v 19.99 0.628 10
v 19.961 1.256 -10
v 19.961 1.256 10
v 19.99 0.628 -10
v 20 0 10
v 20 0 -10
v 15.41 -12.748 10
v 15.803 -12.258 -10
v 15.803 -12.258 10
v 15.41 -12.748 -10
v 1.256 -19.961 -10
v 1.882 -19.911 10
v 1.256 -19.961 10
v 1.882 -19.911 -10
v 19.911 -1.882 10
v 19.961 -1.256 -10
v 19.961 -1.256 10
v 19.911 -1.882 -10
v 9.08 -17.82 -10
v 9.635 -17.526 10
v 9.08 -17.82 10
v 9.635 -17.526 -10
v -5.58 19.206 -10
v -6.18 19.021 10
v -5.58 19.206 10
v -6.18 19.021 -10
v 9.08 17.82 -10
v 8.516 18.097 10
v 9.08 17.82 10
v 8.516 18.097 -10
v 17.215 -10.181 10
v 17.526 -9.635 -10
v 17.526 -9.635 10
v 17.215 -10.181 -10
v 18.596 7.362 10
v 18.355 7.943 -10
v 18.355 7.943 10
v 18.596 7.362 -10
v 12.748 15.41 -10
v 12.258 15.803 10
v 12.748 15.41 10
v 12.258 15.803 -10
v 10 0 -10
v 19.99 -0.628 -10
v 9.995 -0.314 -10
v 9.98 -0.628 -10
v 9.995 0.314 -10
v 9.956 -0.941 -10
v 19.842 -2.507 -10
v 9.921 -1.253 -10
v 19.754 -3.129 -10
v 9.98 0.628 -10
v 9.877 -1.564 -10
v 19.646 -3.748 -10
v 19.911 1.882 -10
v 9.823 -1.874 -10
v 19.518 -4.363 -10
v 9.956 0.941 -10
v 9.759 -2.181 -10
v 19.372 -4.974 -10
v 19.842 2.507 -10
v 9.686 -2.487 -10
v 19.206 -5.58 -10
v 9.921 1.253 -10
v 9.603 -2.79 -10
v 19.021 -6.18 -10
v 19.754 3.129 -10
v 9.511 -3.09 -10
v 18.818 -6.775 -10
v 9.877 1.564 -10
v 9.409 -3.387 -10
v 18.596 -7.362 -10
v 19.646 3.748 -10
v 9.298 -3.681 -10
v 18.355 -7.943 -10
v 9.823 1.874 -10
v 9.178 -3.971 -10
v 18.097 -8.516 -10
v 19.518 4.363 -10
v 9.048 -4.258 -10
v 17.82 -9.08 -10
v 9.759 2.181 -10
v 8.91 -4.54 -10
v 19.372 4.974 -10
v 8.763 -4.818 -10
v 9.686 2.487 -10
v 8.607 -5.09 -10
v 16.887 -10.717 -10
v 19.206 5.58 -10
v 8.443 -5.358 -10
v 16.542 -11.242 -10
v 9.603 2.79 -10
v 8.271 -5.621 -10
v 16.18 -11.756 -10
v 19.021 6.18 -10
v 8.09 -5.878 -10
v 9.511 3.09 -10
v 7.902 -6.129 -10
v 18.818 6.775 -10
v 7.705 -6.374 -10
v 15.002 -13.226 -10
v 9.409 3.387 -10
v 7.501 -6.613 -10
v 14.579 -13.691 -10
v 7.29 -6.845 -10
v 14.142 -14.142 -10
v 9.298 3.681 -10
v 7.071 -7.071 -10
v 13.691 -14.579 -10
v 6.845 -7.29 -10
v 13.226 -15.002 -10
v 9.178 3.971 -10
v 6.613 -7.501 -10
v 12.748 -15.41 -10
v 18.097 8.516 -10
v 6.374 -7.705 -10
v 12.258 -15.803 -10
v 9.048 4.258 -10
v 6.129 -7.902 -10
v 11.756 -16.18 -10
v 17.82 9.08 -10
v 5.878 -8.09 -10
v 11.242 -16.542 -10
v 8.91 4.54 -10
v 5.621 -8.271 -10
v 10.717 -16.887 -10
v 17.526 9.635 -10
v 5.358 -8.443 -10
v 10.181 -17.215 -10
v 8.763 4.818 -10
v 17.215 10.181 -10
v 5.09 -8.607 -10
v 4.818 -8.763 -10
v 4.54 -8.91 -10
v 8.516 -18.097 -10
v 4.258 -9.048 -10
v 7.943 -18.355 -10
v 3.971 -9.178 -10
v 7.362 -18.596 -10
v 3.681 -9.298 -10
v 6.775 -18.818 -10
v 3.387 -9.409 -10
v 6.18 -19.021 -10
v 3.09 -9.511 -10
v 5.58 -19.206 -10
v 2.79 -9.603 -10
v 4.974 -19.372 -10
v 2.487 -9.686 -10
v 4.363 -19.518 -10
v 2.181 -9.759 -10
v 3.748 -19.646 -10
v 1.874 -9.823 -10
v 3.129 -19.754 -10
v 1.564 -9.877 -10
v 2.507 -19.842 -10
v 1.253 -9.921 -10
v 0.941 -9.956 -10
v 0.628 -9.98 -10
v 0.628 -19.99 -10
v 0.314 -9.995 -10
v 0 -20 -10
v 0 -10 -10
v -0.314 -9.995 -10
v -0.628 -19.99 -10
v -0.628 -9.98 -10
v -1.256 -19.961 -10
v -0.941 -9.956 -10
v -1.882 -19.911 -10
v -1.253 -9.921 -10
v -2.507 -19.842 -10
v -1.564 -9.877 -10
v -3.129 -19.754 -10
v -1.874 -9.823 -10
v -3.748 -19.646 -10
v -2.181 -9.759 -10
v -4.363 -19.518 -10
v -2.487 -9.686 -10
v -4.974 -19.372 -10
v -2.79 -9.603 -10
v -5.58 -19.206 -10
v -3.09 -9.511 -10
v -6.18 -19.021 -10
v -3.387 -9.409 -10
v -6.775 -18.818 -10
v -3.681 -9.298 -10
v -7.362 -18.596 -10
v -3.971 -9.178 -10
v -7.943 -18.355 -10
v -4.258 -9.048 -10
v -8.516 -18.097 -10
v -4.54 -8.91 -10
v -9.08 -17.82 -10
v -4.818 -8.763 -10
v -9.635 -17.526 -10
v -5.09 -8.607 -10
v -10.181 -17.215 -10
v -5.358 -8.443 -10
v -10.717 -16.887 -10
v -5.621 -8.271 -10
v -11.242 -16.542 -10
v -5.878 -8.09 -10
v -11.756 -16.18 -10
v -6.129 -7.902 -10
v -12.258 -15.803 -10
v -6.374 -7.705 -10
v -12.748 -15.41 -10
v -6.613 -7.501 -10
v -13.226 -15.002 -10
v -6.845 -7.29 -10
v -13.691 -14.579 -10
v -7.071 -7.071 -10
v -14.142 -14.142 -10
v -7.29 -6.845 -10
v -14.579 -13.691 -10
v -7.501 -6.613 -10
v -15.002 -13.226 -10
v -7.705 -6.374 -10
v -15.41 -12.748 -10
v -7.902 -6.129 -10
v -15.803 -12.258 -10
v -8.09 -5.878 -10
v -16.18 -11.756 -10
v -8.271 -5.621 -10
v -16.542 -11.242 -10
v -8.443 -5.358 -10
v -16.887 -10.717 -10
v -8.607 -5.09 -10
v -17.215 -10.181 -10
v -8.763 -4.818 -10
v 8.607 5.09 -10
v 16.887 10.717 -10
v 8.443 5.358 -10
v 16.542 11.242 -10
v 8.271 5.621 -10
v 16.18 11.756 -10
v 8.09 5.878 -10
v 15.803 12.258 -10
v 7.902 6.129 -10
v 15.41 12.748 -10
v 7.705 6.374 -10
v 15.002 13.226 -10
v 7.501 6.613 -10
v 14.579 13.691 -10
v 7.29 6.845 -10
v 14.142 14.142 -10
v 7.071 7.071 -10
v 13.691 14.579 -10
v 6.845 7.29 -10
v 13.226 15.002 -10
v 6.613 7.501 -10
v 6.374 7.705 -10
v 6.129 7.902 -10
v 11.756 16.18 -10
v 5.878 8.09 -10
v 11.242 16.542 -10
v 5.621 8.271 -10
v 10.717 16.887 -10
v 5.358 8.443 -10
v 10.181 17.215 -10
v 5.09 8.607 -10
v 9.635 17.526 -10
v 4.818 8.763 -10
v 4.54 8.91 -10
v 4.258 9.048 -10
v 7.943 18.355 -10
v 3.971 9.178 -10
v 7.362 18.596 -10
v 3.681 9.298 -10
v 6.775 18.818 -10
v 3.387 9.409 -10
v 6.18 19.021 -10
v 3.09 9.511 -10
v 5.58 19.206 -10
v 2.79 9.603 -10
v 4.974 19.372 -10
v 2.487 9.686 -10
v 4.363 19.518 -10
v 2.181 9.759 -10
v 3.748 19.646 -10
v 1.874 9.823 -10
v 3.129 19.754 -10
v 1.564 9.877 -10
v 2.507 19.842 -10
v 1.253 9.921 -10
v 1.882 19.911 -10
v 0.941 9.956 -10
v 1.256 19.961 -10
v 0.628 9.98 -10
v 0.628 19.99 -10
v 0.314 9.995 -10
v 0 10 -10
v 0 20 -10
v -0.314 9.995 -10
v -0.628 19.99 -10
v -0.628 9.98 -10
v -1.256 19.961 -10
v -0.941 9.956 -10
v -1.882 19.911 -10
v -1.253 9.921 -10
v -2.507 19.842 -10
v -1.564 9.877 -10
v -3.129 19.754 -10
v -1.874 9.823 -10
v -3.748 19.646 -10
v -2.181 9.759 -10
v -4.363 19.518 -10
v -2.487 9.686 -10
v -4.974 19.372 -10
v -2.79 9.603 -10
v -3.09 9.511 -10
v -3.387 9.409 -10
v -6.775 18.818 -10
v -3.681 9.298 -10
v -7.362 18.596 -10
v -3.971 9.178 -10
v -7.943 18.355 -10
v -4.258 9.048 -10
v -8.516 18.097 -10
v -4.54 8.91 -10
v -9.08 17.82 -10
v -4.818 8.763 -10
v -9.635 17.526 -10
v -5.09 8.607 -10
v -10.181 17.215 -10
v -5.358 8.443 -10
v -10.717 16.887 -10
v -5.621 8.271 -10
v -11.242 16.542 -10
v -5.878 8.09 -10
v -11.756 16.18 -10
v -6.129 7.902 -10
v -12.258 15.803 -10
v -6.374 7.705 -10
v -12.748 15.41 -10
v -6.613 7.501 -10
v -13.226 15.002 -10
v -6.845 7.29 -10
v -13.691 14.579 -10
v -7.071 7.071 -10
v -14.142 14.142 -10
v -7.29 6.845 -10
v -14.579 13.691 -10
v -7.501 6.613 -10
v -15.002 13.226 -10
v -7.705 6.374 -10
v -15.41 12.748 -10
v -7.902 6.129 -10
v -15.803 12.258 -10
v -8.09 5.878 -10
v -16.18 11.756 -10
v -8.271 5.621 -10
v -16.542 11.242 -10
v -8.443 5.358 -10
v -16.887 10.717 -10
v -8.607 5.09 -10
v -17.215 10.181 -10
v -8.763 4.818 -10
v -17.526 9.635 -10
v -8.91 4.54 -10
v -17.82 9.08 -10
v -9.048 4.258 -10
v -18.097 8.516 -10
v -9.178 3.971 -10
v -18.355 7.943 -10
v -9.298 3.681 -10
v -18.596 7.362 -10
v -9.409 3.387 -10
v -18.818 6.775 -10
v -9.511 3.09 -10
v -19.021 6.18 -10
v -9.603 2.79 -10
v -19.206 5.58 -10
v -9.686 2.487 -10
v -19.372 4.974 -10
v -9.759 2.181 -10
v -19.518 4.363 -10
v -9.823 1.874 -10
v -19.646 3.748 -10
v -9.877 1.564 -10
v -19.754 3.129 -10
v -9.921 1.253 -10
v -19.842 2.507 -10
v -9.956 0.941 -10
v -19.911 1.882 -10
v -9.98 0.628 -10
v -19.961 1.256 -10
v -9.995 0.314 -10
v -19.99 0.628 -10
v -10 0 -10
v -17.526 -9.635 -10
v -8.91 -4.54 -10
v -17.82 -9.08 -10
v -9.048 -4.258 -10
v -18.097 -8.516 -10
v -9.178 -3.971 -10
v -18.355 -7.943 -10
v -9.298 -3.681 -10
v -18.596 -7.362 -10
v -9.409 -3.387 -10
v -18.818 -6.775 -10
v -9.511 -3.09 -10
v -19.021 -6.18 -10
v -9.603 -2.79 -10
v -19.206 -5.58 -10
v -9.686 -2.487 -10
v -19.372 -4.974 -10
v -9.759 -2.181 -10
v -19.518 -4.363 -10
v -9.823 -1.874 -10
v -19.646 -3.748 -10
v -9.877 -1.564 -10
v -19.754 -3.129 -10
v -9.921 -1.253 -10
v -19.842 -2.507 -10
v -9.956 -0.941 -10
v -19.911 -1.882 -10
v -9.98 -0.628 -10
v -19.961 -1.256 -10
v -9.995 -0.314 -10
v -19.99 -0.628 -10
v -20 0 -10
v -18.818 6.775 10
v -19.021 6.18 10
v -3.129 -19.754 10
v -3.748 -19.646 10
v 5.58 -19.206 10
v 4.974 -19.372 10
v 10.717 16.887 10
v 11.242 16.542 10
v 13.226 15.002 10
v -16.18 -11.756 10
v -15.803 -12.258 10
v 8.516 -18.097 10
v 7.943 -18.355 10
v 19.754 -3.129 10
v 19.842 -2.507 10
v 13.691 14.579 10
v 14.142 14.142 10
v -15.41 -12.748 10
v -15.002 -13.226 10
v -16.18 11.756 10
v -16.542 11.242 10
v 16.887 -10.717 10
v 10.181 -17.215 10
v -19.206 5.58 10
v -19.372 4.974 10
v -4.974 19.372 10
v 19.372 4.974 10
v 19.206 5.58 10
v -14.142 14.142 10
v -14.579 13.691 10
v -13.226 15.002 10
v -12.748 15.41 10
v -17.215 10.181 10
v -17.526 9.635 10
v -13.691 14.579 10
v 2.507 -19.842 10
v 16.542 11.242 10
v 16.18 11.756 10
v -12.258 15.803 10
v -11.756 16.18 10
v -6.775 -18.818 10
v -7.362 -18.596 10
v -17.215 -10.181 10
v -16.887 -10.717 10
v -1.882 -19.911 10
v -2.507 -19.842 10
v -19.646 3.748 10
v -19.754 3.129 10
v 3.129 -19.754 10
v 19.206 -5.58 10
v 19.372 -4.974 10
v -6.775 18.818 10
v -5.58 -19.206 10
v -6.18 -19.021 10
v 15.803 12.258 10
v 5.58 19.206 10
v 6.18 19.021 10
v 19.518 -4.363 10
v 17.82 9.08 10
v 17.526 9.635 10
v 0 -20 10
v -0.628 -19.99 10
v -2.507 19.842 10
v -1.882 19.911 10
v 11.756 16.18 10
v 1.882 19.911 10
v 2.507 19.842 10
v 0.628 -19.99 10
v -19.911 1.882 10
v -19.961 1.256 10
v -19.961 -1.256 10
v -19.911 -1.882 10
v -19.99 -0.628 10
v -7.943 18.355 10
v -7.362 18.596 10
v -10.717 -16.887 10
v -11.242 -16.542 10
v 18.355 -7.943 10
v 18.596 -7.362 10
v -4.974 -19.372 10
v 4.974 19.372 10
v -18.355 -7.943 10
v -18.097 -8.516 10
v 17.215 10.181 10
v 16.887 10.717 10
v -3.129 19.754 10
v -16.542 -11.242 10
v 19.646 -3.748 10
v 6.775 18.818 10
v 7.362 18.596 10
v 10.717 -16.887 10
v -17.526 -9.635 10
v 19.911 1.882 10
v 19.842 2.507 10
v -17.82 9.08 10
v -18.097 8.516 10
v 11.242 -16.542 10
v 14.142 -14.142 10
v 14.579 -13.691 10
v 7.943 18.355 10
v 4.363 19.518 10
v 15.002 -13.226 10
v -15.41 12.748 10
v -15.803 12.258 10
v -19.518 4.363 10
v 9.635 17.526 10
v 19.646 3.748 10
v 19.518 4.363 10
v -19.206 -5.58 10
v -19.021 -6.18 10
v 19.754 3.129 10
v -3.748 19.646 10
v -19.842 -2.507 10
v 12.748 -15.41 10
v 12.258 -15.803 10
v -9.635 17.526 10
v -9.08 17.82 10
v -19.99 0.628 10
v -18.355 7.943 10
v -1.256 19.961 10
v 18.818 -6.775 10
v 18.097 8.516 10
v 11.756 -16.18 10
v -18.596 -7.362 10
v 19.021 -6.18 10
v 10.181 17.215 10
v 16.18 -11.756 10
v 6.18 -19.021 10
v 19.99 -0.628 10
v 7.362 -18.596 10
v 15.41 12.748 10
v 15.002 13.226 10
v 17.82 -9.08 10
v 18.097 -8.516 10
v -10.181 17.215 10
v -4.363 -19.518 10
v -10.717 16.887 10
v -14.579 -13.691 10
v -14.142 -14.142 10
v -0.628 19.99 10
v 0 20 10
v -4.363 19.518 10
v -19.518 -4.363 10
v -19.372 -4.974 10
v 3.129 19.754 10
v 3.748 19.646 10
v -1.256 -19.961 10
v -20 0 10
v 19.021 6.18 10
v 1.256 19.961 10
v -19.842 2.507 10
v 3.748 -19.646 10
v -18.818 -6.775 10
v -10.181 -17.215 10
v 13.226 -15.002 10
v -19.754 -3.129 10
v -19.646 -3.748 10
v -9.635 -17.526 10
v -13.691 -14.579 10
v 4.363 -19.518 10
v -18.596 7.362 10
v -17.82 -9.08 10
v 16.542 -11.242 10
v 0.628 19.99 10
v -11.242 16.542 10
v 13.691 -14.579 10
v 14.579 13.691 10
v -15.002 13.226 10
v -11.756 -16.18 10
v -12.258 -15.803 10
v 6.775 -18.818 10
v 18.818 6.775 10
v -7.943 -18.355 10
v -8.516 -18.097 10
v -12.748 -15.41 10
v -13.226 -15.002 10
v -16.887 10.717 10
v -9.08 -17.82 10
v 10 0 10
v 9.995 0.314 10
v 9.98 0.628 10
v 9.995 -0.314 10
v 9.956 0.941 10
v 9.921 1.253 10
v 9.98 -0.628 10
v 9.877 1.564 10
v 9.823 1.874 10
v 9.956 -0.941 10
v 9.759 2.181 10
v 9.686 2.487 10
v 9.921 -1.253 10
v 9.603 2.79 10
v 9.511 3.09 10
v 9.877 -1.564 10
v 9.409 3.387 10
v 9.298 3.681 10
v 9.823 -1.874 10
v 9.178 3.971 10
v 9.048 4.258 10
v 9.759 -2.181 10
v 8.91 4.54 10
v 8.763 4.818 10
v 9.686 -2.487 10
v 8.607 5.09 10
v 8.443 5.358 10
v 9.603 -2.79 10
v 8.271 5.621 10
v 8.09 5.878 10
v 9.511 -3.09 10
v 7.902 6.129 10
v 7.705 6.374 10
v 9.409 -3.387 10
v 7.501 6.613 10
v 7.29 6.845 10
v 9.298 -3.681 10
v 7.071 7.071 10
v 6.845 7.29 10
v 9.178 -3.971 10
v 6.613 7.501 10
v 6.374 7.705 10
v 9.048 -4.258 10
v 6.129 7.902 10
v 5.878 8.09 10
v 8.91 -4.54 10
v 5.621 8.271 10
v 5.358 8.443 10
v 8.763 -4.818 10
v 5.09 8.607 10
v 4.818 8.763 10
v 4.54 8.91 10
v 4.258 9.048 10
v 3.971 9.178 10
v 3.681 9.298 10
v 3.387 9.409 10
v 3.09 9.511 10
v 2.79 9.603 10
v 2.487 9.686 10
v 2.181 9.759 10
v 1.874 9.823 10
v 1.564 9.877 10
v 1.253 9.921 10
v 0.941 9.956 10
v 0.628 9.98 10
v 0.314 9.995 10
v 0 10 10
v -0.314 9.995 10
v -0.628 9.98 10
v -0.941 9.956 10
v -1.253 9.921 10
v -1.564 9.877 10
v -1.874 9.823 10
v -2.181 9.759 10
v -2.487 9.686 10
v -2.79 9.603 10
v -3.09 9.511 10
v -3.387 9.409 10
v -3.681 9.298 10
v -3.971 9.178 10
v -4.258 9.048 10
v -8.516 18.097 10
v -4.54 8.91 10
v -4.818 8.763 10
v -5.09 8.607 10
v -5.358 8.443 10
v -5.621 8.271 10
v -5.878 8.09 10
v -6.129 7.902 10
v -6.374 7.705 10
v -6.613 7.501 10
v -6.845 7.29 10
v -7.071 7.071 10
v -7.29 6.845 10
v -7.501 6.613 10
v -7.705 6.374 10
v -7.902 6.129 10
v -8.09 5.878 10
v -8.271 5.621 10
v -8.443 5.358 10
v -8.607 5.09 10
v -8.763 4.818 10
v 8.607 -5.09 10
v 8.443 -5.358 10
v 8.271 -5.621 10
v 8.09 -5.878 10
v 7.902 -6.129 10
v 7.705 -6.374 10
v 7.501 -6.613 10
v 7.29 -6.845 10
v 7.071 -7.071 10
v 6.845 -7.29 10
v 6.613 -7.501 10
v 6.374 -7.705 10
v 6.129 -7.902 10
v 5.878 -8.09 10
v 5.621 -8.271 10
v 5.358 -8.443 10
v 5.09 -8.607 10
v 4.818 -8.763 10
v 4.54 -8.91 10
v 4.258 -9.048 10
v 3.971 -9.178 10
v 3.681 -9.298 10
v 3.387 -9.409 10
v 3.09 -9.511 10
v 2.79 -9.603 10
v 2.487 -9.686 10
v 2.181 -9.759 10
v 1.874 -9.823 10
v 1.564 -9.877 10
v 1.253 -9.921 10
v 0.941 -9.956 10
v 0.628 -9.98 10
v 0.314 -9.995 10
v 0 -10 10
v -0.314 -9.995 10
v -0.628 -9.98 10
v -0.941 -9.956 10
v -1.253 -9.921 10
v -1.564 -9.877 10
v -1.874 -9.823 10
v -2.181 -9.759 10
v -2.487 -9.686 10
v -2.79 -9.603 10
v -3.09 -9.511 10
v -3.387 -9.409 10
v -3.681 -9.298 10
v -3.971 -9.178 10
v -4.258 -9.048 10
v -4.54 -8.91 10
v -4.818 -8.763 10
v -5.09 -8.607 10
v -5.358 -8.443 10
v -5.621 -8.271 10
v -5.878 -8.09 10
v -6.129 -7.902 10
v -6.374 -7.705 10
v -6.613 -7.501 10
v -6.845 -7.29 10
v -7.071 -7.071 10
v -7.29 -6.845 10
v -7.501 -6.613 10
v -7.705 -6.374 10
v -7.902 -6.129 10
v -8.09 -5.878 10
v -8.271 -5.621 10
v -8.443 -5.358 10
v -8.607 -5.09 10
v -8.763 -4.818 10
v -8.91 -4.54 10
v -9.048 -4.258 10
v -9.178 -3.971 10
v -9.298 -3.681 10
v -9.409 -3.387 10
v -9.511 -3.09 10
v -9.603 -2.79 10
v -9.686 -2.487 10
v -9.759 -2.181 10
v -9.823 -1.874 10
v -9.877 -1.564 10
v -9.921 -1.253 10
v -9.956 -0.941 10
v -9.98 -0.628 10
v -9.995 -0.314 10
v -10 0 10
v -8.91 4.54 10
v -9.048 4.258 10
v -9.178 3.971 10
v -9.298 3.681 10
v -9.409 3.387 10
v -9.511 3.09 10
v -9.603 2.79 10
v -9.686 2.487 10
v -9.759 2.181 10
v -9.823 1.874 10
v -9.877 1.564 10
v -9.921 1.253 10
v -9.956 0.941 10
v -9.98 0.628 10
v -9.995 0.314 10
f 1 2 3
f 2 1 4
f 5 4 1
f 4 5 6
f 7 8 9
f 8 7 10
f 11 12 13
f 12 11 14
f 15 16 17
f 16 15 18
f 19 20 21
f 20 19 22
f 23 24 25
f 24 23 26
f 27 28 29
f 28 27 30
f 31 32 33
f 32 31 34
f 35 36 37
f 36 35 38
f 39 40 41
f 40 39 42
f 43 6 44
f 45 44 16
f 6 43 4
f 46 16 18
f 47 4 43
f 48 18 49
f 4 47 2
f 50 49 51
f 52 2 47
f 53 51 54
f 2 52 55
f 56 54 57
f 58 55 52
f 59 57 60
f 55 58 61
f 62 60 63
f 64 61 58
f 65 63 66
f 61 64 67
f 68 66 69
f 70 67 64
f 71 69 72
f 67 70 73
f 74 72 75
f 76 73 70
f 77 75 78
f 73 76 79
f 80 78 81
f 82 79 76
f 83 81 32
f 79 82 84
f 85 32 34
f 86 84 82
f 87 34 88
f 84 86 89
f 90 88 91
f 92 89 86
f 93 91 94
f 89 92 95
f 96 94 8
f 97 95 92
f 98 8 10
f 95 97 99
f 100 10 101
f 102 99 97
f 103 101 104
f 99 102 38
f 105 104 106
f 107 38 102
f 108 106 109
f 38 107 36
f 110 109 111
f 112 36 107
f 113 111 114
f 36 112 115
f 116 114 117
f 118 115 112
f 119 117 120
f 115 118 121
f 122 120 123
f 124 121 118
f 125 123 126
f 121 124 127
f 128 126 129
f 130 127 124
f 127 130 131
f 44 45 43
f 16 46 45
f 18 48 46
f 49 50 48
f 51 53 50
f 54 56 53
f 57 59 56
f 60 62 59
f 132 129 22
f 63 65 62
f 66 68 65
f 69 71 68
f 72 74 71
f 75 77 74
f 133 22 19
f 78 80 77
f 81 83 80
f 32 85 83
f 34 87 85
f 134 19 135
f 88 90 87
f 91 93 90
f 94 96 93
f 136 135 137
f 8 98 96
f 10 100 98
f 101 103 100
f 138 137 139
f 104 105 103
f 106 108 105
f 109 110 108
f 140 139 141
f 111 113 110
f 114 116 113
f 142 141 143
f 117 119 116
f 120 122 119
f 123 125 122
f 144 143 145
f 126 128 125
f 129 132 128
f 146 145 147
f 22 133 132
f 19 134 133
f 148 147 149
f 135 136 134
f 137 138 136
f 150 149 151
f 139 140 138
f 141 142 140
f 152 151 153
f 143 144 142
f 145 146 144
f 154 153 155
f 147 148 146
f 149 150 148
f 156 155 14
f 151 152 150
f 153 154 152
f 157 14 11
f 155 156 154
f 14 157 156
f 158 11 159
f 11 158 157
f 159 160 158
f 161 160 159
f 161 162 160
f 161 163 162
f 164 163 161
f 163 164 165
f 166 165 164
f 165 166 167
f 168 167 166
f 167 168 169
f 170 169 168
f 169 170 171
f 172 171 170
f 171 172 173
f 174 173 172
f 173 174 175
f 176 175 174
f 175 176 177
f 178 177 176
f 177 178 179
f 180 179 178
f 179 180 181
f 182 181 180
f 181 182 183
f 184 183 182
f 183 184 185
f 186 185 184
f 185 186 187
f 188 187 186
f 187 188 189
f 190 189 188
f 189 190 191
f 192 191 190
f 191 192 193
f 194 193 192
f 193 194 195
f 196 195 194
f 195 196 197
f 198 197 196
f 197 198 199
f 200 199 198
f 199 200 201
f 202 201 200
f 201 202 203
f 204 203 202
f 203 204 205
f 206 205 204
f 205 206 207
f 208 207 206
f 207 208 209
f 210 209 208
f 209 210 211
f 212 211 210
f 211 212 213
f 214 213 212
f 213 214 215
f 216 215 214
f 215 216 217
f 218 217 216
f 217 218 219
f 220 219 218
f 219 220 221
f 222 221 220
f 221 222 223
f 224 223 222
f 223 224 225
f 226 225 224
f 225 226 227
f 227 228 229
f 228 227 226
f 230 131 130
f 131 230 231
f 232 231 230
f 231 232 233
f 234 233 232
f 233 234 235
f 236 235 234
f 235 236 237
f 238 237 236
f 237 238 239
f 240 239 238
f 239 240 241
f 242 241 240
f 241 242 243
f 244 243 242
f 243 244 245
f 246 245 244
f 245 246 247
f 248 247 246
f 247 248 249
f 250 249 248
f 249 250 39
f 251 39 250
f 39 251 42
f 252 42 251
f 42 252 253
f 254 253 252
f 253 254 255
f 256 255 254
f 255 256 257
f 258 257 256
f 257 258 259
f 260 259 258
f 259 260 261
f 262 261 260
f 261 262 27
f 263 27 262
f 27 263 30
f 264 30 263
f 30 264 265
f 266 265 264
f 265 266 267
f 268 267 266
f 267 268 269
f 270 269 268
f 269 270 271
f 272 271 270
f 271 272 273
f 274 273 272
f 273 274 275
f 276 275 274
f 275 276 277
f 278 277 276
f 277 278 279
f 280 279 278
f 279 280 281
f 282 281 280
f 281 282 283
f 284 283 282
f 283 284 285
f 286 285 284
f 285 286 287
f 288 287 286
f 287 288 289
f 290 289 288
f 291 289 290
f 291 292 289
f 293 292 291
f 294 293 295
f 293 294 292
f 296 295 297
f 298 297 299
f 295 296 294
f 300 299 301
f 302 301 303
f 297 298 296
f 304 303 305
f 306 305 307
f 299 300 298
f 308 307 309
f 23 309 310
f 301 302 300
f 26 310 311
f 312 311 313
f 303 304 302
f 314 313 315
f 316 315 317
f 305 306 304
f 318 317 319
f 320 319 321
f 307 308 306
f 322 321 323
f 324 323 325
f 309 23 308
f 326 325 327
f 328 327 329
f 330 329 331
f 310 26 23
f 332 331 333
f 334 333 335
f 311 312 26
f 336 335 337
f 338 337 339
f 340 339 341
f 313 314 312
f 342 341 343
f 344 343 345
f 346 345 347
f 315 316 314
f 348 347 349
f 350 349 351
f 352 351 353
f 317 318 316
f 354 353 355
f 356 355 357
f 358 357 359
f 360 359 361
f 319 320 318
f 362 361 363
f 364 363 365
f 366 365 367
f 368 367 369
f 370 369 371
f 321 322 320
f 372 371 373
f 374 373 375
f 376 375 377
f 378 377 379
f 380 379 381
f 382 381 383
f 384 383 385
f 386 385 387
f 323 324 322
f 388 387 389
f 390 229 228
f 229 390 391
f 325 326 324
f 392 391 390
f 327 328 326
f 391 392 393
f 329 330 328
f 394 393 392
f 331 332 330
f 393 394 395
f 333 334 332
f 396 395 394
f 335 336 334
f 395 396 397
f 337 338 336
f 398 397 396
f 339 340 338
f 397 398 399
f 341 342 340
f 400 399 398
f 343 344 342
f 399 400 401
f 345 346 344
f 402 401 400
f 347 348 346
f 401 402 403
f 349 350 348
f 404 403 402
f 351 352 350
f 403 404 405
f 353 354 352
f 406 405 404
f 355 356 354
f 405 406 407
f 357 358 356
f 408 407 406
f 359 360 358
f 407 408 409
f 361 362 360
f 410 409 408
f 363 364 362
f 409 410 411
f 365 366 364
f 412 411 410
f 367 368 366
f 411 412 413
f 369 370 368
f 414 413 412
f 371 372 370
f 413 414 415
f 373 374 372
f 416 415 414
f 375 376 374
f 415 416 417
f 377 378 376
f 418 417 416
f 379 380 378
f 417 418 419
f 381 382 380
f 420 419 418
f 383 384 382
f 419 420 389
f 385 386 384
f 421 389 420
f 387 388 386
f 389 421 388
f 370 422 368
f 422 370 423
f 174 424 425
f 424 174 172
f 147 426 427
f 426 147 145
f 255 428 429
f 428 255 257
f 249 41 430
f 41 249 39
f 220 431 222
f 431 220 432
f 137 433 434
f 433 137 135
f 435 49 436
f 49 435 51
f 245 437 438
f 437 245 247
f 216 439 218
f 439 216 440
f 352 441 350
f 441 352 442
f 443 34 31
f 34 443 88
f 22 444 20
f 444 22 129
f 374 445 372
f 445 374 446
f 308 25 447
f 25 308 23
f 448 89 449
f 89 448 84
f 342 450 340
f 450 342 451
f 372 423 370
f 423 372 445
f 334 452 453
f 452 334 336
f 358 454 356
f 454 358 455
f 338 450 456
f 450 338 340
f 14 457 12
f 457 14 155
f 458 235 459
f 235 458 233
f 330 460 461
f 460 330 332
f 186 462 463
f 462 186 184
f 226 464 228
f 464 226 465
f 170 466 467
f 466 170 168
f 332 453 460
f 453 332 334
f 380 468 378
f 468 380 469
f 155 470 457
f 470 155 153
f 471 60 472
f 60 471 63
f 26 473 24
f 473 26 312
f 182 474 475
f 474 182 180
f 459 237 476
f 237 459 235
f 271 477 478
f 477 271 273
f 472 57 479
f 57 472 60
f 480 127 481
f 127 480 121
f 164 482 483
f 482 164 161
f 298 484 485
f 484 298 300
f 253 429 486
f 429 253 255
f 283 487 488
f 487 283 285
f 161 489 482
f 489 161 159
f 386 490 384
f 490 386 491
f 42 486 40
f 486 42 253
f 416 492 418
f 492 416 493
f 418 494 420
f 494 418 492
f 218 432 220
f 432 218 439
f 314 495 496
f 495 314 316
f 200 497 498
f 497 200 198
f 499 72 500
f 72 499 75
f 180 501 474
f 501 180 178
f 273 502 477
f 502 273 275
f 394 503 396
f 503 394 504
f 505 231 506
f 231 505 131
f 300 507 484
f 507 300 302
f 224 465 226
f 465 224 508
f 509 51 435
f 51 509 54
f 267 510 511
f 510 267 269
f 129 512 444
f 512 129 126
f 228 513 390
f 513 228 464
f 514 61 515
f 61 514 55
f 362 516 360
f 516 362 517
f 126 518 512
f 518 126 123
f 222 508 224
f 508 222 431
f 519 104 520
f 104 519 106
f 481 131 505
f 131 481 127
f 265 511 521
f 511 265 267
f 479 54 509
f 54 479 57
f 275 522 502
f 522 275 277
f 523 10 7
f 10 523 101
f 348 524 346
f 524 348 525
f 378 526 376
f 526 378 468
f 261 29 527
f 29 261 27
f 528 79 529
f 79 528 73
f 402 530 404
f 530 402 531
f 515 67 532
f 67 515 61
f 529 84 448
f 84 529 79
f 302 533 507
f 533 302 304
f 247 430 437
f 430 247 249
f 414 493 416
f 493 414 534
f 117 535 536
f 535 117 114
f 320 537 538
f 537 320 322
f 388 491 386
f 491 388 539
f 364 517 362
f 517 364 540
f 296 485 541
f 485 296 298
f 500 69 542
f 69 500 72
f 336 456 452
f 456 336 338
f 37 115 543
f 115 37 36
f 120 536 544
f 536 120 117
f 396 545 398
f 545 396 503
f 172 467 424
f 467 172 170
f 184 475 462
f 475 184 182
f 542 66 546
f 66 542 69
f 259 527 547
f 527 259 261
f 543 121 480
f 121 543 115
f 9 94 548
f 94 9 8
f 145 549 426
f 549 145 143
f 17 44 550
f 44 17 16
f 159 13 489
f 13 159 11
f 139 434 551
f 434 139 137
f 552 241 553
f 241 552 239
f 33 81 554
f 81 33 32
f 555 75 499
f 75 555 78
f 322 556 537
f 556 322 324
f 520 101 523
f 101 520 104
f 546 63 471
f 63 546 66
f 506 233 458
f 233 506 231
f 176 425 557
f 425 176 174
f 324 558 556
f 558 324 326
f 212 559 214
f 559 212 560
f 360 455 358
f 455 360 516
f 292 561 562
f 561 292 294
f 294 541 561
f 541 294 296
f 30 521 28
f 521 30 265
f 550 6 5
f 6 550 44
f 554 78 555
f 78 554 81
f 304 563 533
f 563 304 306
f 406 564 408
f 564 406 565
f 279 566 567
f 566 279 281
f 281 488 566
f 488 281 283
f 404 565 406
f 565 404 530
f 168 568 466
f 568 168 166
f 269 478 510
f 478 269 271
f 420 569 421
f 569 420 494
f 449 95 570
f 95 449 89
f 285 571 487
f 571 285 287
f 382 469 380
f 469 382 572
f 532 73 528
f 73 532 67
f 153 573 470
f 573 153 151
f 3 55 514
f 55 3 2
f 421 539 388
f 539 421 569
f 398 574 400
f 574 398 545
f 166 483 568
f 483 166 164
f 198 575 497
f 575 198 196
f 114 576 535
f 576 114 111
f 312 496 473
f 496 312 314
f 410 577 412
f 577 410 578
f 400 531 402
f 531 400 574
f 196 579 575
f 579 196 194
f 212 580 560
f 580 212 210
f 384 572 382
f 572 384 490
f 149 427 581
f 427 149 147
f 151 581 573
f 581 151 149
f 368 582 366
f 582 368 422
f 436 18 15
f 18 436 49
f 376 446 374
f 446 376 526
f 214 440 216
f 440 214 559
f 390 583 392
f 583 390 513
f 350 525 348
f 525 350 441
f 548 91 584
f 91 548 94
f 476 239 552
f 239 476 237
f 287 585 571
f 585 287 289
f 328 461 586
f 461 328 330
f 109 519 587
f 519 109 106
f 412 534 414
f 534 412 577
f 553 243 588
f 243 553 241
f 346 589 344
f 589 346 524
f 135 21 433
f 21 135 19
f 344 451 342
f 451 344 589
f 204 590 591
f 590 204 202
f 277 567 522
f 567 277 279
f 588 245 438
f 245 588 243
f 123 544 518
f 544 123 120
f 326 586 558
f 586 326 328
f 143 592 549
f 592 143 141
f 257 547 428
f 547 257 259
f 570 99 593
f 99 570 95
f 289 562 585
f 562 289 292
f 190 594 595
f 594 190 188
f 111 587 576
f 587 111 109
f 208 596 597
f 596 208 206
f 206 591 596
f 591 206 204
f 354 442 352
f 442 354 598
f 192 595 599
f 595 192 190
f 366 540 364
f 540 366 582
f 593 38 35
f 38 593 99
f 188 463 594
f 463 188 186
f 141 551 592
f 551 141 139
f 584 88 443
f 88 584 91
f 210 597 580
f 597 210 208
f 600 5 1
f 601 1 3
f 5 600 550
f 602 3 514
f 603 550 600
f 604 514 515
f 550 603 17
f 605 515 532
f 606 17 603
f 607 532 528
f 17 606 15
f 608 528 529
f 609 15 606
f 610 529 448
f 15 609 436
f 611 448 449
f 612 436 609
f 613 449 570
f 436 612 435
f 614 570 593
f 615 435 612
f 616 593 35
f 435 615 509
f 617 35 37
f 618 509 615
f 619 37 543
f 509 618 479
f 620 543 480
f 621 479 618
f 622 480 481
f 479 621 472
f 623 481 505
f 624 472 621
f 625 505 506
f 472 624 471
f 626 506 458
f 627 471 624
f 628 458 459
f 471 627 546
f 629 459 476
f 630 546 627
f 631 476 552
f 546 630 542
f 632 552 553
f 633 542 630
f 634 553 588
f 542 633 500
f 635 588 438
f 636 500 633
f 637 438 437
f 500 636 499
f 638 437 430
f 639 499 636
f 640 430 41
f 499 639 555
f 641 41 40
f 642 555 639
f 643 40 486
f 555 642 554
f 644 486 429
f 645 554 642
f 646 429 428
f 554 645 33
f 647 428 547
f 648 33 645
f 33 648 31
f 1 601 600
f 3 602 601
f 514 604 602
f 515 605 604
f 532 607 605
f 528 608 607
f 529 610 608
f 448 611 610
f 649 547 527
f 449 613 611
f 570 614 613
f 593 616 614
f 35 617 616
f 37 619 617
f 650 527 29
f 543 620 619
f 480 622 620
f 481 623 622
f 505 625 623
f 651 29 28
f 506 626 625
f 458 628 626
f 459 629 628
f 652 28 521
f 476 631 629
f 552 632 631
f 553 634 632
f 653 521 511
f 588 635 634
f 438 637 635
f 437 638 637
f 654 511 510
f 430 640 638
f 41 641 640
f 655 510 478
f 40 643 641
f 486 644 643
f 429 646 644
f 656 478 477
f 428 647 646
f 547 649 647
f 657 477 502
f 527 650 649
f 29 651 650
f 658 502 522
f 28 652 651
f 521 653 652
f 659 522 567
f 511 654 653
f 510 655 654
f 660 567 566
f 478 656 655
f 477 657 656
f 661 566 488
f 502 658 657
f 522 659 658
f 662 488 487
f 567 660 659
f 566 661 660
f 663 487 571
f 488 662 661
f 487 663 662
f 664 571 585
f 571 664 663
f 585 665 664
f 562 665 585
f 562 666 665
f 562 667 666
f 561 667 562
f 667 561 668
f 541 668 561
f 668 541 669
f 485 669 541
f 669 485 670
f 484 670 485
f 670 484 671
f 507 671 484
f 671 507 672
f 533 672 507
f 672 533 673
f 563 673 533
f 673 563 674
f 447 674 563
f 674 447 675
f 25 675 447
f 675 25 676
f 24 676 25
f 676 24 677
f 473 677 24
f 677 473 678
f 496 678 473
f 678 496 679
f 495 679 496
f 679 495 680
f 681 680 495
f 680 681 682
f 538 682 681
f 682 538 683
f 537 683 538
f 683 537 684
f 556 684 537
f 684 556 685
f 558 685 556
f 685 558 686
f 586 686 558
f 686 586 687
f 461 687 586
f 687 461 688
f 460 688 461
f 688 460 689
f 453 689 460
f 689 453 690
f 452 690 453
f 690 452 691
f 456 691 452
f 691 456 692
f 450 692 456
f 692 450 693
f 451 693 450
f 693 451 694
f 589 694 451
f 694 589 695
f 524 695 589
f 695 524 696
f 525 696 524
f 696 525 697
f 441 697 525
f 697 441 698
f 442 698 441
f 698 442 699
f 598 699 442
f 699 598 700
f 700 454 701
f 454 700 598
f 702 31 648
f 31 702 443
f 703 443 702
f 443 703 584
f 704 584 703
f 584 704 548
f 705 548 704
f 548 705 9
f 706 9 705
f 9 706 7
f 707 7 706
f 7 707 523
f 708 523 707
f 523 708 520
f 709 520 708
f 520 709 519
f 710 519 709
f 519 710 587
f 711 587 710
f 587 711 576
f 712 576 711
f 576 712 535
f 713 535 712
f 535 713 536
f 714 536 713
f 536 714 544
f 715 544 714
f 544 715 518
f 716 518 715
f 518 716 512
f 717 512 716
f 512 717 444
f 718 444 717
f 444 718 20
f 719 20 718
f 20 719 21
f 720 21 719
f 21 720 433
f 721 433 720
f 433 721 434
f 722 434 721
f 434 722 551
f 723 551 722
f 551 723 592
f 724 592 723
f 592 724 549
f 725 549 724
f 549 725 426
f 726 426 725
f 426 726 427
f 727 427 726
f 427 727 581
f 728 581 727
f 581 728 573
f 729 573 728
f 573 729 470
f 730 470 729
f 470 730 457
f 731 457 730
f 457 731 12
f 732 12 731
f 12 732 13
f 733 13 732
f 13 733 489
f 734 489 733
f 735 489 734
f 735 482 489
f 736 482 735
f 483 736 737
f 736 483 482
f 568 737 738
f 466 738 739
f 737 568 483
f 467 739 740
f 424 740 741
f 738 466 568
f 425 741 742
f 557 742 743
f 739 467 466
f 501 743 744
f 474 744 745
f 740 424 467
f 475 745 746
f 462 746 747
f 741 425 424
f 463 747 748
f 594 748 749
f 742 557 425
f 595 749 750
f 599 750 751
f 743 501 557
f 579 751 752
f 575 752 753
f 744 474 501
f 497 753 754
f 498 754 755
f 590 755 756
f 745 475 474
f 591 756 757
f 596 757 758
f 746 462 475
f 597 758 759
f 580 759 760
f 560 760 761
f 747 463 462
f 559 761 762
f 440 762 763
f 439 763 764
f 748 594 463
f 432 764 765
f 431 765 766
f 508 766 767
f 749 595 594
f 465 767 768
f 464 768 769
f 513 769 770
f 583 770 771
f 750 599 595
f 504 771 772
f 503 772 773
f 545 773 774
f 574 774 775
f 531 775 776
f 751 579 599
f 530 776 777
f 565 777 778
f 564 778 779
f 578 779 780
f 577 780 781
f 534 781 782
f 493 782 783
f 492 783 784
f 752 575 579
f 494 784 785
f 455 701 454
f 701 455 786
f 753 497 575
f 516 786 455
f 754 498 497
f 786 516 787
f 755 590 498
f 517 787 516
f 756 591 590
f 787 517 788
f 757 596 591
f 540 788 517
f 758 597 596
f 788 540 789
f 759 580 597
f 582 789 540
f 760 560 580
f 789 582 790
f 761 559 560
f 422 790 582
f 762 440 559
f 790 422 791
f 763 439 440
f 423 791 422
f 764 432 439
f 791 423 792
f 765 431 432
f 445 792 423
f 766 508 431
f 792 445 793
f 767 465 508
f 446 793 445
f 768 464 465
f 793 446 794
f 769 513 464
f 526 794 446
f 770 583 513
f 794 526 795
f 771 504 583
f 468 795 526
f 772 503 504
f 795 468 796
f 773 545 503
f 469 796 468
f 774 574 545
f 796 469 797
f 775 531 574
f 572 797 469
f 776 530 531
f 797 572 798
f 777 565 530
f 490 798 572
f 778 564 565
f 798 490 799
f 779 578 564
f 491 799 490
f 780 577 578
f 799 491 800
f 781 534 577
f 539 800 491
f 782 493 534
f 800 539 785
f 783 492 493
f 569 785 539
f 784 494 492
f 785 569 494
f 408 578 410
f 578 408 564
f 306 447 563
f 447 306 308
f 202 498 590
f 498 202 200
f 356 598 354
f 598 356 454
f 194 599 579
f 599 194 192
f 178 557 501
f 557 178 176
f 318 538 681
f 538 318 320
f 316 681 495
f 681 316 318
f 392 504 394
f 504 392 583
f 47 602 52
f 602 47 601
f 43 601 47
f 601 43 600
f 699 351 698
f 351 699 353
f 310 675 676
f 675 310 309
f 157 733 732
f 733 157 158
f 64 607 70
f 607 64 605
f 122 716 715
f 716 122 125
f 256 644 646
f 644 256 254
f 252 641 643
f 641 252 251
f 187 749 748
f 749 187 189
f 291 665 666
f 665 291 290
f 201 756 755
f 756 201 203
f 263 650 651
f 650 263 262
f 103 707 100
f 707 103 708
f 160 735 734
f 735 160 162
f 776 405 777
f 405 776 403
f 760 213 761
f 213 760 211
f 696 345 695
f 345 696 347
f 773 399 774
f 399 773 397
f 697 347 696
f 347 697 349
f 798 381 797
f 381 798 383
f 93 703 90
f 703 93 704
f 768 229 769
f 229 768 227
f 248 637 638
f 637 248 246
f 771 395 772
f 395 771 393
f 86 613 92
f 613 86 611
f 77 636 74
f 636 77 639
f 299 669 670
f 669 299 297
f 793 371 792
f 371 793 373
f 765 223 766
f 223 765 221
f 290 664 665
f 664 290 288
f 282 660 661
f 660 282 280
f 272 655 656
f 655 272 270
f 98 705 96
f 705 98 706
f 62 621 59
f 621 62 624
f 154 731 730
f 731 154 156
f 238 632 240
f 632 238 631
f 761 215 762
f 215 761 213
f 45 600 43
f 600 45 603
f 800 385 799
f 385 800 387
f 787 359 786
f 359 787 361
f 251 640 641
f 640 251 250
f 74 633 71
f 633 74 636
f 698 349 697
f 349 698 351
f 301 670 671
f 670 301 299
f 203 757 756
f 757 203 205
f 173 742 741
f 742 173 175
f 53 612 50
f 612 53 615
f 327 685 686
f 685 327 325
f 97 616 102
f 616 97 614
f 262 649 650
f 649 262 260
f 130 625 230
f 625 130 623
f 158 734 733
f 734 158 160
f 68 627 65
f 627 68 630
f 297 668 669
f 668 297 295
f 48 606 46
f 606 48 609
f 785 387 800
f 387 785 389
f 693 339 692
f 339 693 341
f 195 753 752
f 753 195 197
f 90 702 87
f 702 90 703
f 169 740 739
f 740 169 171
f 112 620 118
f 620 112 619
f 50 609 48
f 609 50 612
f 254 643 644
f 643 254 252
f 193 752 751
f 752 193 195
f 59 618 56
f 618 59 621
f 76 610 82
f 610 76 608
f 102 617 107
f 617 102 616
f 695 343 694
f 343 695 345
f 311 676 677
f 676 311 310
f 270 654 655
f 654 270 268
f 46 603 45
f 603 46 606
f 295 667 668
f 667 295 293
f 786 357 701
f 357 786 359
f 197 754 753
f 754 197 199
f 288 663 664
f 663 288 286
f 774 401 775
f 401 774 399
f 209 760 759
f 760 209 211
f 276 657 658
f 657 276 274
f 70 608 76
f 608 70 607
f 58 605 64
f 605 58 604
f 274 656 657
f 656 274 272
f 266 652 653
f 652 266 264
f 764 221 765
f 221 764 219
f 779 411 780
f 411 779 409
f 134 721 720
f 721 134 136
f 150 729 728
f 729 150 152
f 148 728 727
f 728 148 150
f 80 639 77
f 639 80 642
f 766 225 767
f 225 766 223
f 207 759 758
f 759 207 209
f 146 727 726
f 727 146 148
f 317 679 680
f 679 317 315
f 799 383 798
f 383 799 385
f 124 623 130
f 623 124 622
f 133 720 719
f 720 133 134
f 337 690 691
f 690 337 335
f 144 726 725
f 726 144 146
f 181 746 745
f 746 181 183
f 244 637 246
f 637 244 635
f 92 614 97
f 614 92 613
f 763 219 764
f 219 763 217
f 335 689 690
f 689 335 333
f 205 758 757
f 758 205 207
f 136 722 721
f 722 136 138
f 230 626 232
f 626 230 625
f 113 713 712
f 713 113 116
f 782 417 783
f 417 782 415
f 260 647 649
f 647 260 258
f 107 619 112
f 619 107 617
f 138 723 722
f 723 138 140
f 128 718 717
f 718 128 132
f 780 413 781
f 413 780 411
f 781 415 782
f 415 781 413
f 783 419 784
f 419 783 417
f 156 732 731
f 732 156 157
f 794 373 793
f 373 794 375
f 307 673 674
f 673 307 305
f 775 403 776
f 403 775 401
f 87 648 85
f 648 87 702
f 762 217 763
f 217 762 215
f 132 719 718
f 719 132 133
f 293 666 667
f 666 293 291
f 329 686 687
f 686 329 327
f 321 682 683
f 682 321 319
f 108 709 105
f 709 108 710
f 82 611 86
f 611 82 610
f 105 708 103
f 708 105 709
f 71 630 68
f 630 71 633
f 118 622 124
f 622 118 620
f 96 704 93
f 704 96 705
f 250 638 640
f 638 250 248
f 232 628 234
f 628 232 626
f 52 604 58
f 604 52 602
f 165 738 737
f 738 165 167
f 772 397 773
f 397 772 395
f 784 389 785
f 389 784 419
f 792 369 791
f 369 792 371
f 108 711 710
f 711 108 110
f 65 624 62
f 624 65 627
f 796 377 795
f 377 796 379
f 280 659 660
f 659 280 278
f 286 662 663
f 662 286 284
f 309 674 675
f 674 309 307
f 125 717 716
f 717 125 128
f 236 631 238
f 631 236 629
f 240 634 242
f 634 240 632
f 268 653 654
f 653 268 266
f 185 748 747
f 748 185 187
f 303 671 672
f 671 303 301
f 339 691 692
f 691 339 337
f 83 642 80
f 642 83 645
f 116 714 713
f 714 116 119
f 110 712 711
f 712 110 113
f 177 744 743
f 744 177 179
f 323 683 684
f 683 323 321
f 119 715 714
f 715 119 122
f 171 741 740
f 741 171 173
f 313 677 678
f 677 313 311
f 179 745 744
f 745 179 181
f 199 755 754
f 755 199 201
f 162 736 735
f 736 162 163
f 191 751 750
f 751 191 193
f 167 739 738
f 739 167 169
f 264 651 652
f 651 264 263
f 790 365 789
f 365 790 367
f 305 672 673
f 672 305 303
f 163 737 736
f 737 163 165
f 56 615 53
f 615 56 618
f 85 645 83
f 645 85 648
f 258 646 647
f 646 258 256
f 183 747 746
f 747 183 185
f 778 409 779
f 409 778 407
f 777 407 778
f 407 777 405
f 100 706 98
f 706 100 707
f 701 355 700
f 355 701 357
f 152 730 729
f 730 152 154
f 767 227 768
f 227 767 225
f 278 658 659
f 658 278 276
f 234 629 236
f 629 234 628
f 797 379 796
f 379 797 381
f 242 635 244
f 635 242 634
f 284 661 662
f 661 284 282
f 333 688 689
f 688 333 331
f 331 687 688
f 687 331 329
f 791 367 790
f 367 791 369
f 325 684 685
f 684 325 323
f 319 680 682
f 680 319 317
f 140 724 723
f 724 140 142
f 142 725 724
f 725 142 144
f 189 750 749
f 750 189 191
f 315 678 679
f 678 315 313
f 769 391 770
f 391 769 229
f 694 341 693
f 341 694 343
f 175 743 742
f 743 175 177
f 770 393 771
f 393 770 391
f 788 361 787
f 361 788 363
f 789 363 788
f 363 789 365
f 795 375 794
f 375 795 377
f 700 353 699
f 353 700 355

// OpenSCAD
// Units: millimeters

// Parameters
outer_diameter = 40; // mm
inner_diameter = 20; // mm (hole diameter)
height = 20; // mm (thickness of the ring)
$fn = 200; // facet count for roundness
center_geometry = true; // center the cylinders on the origin

// Parameter validation
// If inner_diameter >= outer_diameter, adjust inner_diameter
corrected_inner_diameter = (inner_diameter >= outer_diameter) ? outer_diameter * 0.5 : inner_diameter;
// Adjustment applied if inner_diameter was >= outer_diameter

// Geometry construction
difference() {
    // Outer cylinder
    cylinder(h = height, d = outer_diameter, center = center_geometry);
    
    // Inner cylinder (through-hole) - slightly taller to ensure clean subtraction
    cylinder(h = height + 2, d = corrected_inner_diameter, center = center_geometry);
}
